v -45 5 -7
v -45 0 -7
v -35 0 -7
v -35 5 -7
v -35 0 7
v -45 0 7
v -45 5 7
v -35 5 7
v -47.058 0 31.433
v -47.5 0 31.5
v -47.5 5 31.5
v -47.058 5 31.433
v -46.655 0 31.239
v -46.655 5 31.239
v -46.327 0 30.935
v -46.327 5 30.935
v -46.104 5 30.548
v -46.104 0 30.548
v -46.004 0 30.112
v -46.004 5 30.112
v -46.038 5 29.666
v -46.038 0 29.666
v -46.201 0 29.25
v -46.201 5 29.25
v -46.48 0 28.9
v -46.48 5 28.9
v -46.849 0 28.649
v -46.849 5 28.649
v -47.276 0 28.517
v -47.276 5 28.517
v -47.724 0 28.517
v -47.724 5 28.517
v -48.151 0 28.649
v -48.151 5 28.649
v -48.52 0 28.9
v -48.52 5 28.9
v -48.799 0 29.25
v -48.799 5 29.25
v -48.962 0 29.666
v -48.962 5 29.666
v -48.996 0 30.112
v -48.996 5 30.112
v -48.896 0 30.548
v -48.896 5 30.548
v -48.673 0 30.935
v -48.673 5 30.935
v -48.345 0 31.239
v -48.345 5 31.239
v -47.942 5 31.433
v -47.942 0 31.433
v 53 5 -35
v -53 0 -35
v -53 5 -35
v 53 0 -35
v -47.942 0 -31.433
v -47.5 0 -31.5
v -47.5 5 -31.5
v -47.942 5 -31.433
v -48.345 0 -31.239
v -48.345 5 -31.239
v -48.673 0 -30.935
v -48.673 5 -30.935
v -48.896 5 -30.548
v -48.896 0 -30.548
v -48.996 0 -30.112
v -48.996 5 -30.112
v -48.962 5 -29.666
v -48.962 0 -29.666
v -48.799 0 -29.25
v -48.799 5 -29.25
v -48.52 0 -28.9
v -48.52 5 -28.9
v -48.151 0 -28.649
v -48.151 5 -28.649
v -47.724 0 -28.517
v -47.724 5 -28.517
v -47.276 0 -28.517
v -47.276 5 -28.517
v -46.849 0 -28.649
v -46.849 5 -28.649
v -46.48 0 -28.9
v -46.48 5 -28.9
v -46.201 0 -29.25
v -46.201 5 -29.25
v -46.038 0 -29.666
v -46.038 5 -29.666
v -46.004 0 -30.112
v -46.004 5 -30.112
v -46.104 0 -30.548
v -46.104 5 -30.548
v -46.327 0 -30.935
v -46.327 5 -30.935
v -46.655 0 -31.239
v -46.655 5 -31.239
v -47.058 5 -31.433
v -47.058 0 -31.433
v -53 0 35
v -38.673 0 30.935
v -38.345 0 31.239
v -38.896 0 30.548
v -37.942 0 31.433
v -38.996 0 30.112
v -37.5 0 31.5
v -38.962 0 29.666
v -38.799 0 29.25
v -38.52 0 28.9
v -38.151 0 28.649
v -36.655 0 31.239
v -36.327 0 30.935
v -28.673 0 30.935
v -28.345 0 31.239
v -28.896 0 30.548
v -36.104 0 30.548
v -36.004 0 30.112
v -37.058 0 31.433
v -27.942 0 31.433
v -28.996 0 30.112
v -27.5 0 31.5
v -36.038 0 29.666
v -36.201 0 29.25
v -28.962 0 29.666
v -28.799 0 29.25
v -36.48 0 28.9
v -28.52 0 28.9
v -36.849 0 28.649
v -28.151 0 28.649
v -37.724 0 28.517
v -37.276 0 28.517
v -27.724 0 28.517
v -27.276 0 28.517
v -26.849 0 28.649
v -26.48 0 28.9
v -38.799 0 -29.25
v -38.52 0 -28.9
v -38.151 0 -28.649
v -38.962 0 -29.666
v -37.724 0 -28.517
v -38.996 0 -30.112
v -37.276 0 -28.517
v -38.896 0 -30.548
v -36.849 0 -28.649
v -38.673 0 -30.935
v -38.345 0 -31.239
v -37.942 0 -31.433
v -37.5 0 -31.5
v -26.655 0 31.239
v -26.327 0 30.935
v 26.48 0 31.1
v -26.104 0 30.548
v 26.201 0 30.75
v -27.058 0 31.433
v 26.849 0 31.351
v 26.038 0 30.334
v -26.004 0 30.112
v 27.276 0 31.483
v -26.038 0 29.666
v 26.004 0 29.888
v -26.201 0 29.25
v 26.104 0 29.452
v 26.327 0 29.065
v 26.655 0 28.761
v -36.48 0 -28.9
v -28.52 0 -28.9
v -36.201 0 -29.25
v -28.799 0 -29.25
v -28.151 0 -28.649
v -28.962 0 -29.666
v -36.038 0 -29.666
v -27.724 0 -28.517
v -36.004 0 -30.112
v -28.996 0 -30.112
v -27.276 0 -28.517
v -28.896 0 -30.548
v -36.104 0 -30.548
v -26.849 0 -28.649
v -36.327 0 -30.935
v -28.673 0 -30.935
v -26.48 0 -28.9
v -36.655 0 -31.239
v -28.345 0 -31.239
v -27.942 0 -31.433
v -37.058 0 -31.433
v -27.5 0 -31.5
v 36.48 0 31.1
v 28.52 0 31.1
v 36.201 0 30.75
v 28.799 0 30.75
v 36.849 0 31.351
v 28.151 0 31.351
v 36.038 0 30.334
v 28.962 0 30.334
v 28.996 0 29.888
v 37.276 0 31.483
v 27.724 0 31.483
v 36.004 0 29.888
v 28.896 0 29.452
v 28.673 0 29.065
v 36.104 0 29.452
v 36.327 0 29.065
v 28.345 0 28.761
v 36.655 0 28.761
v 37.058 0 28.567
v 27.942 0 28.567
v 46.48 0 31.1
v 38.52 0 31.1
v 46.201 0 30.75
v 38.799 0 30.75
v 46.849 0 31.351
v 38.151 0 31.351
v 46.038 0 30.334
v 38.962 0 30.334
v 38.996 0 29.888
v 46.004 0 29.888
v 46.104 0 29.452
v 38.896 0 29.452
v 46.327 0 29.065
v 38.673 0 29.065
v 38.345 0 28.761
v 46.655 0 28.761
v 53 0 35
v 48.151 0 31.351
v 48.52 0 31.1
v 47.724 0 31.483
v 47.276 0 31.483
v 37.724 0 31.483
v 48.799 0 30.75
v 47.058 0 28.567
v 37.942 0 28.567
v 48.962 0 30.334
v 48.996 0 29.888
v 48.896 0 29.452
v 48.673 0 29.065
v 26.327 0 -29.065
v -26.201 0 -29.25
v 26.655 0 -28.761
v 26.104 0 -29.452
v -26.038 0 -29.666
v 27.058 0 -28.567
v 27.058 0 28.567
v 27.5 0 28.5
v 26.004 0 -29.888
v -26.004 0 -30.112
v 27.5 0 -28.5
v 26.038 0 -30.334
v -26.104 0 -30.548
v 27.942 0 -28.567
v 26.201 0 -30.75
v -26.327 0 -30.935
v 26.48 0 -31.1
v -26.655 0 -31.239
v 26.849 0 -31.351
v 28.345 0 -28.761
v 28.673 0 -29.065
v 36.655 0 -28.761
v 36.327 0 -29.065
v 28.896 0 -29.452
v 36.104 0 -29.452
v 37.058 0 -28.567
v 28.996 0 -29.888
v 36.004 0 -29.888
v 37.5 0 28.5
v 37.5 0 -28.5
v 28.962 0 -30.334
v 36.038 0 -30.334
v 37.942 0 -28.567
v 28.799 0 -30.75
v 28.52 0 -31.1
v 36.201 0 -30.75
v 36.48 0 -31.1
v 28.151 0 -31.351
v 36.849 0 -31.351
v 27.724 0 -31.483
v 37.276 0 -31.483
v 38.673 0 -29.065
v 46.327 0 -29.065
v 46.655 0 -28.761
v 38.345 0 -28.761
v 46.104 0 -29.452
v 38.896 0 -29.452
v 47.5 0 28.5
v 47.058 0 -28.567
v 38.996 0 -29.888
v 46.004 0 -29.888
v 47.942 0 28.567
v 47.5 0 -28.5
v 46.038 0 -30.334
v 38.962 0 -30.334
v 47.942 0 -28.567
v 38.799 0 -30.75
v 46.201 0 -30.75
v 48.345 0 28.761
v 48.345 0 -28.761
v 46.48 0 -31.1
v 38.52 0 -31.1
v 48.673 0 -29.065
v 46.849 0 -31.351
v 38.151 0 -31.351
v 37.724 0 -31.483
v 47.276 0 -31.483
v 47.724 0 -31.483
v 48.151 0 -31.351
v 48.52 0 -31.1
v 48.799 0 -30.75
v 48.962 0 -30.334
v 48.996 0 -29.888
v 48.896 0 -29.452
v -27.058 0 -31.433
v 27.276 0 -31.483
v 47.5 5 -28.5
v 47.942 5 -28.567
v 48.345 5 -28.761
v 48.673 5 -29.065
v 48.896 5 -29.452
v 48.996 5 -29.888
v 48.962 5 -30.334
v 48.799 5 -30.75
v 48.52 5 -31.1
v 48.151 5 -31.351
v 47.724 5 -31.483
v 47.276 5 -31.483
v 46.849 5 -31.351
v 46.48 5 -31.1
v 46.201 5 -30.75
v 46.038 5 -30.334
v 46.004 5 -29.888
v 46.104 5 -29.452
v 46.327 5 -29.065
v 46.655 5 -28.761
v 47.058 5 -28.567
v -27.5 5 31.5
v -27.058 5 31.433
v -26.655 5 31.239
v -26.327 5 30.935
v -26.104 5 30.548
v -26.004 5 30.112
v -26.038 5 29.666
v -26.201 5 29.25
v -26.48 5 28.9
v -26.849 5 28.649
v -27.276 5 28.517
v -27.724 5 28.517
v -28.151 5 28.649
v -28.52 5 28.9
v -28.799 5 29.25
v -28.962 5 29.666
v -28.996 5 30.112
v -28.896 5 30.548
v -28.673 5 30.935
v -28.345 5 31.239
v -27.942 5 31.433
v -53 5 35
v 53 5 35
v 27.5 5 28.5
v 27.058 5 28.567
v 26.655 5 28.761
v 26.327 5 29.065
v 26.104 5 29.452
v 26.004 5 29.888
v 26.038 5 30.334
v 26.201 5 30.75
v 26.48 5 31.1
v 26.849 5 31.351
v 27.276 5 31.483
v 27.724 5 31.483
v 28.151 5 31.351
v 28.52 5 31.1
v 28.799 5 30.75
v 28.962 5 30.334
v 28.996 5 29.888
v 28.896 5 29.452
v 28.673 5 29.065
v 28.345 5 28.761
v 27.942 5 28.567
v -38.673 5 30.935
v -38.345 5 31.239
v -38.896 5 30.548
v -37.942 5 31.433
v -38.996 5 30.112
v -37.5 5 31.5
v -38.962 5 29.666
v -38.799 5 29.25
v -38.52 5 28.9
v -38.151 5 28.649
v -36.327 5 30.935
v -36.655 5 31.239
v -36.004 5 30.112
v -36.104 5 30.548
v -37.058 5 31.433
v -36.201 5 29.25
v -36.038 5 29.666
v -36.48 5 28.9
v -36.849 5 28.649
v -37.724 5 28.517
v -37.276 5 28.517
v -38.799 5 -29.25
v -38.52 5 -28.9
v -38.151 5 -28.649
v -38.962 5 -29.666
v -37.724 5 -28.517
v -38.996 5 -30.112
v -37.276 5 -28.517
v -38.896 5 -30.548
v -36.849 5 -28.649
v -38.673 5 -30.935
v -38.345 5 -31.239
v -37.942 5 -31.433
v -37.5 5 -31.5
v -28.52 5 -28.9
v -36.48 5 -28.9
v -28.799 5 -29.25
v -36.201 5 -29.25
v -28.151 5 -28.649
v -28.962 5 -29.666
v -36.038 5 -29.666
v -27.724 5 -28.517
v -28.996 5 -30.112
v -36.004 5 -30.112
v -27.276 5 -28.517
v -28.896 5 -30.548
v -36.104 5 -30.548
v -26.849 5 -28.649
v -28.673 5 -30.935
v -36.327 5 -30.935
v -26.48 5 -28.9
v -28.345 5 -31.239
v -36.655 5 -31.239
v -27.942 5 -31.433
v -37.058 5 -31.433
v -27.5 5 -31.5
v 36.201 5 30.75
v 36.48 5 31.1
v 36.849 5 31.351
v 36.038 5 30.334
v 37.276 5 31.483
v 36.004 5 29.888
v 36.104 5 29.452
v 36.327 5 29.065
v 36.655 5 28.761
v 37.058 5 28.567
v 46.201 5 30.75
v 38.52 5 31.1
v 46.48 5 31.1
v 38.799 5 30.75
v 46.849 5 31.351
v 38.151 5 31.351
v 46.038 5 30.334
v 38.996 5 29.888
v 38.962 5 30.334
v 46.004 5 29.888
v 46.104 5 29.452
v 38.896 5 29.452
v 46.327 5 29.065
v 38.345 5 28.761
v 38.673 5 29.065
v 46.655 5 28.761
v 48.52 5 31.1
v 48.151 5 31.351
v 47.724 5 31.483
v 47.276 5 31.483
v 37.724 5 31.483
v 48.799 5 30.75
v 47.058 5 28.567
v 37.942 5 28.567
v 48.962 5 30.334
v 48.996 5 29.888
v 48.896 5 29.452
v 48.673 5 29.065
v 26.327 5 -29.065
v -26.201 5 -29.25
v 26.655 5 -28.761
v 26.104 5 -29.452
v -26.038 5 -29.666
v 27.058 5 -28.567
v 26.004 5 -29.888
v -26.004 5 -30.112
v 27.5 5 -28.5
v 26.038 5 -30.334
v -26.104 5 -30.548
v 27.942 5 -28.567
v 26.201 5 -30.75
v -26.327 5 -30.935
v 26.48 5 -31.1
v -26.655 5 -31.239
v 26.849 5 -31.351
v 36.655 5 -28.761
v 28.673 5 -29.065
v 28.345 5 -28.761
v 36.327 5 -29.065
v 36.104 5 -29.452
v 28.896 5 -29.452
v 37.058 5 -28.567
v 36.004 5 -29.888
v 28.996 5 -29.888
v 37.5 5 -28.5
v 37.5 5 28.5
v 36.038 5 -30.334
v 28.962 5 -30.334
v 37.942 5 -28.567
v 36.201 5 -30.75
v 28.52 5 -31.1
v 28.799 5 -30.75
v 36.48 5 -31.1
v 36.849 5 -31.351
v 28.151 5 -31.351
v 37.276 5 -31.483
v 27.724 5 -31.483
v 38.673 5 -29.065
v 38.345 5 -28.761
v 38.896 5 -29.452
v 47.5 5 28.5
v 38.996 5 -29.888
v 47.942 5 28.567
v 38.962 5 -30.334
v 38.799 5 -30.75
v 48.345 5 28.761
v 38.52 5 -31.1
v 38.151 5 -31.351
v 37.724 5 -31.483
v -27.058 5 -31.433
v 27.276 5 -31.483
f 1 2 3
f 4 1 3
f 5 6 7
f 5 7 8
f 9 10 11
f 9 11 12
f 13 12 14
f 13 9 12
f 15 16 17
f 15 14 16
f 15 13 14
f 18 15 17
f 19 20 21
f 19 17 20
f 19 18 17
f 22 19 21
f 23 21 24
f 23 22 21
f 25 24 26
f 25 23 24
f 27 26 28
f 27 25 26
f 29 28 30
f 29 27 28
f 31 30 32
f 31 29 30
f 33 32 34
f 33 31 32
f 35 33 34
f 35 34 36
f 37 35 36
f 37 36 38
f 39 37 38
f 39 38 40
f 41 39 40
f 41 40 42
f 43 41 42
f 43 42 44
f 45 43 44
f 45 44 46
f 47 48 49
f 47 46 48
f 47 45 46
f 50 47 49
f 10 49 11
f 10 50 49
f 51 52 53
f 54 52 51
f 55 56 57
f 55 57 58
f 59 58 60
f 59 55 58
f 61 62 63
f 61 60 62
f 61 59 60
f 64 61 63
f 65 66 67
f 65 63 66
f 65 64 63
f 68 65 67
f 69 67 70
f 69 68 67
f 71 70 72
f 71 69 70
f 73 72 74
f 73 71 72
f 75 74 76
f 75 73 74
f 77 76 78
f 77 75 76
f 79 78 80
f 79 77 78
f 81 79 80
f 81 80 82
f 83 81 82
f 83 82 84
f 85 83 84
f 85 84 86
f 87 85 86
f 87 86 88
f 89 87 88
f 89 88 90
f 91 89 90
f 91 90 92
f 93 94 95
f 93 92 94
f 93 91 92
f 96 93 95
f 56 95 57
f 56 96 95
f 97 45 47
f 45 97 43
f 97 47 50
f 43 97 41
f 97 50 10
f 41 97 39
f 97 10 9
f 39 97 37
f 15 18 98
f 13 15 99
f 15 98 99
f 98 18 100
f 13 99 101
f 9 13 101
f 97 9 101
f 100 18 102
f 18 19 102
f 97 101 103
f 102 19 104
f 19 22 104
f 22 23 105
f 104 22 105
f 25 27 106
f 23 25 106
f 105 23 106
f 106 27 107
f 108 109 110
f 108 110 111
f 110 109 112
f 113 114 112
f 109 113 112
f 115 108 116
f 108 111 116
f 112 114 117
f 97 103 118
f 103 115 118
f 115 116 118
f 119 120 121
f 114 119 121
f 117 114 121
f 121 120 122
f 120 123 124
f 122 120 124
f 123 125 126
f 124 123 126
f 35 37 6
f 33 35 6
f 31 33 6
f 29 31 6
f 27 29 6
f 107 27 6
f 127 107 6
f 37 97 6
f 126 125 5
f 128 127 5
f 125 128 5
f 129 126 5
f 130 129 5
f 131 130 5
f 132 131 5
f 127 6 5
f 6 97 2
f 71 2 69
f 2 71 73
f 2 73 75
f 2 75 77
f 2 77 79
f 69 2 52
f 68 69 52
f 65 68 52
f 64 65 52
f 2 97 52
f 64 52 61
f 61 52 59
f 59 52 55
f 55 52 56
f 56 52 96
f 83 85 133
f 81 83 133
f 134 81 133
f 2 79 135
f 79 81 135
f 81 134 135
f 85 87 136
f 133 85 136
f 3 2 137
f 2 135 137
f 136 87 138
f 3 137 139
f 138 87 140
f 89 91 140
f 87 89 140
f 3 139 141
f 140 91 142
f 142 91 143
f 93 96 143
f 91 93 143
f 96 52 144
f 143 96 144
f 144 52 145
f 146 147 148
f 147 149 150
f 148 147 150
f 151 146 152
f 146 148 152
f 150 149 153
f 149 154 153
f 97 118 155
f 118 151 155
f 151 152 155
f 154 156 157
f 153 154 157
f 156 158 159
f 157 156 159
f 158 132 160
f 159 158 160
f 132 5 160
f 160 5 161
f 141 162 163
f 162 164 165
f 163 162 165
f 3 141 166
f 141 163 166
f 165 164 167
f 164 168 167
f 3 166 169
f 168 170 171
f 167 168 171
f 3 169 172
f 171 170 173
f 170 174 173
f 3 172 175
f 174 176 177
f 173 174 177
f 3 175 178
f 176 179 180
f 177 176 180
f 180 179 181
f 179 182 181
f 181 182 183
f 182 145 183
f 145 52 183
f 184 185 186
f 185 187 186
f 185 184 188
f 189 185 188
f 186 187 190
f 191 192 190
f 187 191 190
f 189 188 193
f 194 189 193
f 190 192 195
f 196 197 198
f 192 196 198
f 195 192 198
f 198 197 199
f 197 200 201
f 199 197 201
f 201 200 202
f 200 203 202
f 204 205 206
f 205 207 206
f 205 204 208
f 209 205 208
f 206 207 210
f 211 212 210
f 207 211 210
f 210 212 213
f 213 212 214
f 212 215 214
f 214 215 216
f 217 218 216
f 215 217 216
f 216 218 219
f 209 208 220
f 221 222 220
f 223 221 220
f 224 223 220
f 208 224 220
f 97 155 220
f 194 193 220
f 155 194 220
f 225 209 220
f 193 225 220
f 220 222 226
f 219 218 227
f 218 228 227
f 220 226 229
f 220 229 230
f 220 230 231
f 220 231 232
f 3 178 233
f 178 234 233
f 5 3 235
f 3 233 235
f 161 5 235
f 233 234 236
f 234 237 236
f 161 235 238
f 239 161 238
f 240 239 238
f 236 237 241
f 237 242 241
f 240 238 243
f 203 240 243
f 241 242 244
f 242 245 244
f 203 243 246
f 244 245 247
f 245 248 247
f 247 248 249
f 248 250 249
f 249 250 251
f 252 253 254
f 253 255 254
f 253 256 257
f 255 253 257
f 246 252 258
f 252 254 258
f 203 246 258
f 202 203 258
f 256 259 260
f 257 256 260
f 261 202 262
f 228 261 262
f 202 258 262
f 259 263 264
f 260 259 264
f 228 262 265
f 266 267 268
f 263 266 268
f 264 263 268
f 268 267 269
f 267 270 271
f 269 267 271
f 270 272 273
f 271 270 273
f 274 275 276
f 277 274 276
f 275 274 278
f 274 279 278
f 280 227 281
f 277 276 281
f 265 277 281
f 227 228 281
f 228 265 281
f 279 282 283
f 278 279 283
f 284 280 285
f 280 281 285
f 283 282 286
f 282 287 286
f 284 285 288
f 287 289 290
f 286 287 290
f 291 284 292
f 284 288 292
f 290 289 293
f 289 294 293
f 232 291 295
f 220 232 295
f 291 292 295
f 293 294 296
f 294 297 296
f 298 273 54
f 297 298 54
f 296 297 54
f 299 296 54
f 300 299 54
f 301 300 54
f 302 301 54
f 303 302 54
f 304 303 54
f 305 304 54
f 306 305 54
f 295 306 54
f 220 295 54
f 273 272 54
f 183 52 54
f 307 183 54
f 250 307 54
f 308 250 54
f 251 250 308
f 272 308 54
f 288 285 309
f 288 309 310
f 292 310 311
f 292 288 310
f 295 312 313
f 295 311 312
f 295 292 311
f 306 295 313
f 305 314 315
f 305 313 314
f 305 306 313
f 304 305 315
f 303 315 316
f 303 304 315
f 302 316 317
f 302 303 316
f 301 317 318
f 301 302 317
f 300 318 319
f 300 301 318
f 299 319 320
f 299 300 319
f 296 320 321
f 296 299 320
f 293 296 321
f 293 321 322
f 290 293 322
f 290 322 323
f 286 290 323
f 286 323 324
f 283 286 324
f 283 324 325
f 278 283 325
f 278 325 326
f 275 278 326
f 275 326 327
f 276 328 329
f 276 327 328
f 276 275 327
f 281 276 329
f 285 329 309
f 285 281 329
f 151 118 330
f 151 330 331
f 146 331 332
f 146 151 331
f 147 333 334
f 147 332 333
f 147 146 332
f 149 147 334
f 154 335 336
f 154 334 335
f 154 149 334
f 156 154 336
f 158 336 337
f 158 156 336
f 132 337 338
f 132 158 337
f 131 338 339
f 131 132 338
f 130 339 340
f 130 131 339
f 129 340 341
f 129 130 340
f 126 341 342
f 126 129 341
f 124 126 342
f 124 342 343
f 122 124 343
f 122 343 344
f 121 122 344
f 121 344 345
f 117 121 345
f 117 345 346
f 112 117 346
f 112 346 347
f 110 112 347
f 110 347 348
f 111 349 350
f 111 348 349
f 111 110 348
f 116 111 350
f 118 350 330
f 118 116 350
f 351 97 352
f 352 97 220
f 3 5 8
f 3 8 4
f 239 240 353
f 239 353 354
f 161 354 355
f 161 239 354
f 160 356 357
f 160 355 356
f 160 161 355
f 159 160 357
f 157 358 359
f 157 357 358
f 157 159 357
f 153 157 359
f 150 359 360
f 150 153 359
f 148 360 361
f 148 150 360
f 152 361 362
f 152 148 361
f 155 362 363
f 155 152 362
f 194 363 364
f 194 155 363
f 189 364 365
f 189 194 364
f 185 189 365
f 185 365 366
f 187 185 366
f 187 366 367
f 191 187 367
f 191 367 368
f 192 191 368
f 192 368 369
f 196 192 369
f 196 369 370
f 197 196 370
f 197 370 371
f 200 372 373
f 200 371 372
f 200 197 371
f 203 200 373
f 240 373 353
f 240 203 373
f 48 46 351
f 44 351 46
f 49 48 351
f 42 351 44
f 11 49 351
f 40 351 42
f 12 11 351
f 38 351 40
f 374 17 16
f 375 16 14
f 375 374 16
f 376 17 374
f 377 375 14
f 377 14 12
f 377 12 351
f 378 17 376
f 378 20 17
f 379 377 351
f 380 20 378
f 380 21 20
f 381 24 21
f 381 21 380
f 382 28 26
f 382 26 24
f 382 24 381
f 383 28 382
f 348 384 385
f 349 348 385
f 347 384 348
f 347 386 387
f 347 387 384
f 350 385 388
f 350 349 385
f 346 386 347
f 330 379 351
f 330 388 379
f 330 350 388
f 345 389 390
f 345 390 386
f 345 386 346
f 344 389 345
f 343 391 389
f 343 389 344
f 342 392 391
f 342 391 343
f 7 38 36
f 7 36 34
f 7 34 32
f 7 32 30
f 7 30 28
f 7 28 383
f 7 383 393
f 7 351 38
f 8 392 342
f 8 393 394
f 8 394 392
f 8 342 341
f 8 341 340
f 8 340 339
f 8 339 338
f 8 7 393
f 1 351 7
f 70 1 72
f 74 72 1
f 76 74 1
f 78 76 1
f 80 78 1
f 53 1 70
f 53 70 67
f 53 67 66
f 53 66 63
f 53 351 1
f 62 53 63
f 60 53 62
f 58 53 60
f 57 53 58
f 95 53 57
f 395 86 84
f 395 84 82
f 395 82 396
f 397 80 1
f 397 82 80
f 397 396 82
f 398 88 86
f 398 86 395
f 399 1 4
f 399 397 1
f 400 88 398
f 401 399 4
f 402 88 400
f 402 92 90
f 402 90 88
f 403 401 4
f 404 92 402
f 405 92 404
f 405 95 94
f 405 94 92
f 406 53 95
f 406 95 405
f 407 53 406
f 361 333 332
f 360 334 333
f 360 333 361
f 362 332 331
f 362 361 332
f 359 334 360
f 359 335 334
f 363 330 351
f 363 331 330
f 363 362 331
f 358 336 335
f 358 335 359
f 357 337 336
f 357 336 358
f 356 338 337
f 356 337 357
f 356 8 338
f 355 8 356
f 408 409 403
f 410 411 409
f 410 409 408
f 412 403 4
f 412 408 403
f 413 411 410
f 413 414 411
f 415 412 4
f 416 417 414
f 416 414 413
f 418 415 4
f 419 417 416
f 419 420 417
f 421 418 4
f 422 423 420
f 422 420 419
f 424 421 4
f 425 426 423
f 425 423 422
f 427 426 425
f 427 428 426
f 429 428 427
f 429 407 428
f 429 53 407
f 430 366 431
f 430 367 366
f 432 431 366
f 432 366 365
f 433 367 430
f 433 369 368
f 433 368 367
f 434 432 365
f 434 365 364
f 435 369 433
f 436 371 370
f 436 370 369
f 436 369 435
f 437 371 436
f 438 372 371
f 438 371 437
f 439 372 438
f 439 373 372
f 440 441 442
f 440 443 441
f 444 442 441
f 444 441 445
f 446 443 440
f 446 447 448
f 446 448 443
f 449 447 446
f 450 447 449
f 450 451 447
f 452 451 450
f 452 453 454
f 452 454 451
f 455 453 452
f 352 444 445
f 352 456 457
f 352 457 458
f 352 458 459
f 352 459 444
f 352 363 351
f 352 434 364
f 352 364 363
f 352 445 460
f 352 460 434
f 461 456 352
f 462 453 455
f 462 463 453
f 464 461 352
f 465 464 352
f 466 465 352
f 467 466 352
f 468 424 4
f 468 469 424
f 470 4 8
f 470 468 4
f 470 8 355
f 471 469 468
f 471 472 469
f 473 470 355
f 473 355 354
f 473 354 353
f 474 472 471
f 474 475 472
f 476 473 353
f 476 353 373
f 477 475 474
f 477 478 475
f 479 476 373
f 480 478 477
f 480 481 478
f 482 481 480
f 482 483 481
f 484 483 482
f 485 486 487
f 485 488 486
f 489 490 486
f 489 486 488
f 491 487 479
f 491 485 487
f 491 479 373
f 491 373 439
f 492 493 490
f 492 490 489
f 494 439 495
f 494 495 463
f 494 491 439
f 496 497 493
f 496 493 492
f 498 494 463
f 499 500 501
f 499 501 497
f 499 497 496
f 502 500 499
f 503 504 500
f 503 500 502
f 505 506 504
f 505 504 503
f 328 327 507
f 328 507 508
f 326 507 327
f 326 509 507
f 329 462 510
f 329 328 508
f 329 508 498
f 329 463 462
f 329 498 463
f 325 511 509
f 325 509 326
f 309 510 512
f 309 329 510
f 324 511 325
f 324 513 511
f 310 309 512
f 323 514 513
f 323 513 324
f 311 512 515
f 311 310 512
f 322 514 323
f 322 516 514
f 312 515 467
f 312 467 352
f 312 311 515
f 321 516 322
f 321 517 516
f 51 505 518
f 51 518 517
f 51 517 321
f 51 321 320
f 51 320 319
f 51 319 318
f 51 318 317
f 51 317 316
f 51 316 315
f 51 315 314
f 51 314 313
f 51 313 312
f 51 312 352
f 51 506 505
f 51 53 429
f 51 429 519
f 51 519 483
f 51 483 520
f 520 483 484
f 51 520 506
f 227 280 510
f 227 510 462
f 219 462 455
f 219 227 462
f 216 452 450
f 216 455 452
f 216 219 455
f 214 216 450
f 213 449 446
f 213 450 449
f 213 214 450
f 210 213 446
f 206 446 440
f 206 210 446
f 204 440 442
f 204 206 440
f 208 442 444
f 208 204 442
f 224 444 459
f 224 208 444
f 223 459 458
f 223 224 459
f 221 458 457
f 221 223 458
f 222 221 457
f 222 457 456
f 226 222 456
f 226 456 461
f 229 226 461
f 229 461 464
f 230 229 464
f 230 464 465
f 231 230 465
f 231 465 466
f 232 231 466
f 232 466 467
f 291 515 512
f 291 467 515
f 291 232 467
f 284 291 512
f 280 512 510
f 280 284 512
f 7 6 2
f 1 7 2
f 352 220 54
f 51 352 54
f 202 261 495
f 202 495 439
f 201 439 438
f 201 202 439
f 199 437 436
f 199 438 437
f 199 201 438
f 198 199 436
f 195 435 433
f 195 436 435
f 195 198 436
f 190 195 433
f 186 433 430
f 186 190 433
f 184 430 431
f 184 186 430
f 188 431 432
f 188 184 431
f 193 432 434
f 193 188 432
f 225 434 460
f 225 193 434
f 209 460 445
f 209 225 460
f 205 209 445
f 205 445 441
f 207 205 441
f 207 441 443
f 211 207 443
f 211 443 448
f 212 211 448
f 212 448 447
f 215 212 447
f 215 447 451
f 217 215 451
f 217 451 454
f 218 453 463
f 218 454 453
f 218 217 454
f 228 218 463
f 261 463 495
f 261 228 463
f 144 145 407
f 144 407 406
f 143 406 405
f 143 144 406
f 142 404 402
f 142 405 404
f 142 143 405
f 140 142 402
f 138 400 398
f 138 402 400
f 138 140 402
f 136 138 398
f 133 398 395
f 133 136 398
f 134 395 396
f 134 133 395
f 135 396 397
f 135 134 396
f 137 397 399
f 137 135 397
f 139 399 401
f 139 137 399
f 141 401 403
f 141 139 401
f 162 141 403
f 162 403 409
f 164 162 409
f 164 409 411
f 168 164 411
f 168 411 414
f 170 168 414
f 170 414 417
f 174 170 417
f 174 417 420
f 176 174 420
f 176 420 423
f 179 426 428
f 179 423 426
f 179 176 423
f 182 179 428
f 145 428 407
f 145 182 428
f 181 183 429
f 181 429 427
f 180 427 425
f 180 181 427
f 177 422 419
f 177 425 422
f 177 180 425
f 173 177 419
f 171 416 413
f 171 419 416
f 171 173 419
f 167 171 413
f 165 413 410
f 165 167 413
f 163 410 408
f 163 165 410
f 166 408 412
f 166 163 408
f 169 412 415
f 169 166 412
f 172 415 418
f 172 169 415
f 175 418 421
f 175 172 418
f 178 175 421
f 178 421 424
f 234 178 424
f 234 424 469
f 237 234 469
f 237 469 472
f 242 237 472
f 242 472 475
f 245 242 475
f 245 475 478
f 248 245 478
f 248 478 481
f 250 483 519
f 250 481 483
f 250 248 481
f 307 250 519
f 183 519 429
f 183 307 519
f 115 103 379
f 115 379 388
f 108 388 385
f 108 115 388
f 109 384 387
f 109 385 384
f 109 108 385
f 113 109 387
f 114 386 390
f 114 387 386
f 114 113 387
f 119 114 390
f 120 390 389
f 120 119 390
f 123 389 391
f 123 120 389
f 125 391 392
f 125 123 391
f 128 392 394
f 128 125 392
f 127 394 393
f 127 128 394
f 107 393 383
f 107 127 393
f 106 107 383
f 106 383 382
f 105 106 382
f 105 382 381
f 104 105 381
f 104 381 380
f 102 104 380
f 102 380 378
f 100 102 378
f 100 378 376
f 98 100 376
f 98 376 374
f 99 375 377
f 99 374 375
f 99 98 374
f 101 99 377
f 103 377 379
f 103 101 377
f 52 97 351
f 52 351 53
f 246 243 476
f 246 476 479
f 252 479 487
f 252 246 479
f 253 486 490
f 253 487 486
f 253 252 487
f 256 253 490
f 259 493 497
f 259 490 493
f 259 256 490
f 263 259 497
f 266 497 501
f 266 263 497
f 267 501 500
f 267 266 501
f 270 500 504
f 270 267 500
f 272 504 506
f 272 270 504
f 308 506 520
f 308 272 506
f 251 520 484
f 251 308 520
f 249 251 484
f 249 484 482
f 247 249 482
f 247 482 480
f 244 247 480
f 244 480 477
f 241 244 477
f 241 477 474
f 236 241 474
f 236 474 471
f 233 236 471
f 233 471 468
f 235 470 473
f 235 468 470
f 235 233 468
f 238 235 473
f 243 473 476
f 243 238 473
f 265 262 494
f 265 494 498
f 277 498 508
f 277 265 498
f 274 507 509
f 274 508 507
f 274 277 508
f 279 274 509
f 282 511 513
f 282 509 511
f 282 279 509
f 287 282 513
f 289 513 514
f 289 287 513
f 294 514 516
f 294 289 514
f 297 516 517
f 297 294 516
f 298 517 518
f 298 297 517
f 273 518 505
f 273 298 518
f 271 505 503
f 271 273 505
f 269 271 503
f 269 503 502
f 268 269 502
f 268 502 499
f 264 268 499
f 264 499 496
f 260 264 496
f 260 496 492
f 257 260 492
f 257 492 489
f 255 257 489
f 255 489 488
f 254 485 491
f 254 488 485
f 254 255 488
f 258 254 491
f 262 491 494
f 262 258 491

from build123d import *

# Parameters (mm, degrees)
SKETCH1_W               = 120
SKETCH1_H               = 70
BOSS_EXTRUDE1_DEPTH     = 5
CUT_EXTRUDE1_DEPTH      = 70.641941386
CUT_EXTRUDE1_DEPTH_BACK = 70.641941386
SKETCH2_W               = 10
SKETCH2_H               = 14
CUT_EXTRUDE2_DEPTH      = 70.641941386
CUT_EXTRUDE2_DEPTH_BACK = 70.641941386
SKETCH3_W               = 7
SKETCH3_H               = 70
CUT_EXTRUDE3_DEPTH      = 64.710281745
CUT_EXTRUDE3_DEPTH_BACK = 64.710281745
SKETCH4_R               = 1.5


with BuildPart() as part:
    # Sketch1 → Boss-Extrude1 (new body)
    with BuildSketch(Plane(origin=(0, 0, 0), x_dir=(1, 0, 0), z_dir=(0, 1, 0))):
        Rectangle(SKETCH1_W, SKETCH1_H)
    extrude(amount=BOSS_EXTRUDE1_DEPTH)

    # Sketch2 → Cut-Extrude1 (cut, two sides: drawn at the far end of the back side and taken through both)
    with BuildSketch(Plane(origin=(0, 5, 0), x_dir=(1, 0, 0), z_dir=(0, 1, 0)).offset(-CUT_EXTRUDE1_DEPTH_BACK)):
        with Locations((-40, 0)):
            Rectangle(SKETCH2_W, SKETCH2_H)
    extrude(amount=CUT_EXTRUDE1_DEPTH + CUT_EXTRUDE1_DEPTH_BACK, mode=Mode.SUBTRACT)

    # Sketch3 → Cut-Extrude2 (cut, two sides: drawn at the far end of the back side and taken through both)
    with BuildSketch(Plane(origin=(0, 5, 0), x_dir=(1, 0, 0), z_dir=(0, 1, 0)).offset(-CUT_EXTRUDE2_DEPTH_BACK)):
        with Locations((56.5, 0)):
            Rectangle(SKETCH3_W, SKETCH3_H)
        with Locations((-56.5, 0)):
            Rectangle(SKETCH3_W, SKETCH3_H)
    extrude(amount=CUT_EXTRUDE2_DEPTH + CUT_EXTRUDE2_DEPTH_BACK, mode=Mode.SUBTRACT)

    # Sketch4 → Cut-Extrude3 (cut, two sides: drawn at the far end of the back side and taken through both)
    with BuildSketch(Plane(origin=(0, 5, 0), x_dir=(1, 0, 0), z_dir=(0, 1, 0)).offset(-CUT_EXTRUDE3_DEPTH_BACK)):
        with Locations(Location((-37.5, -30, 0), (0, 0, 270))):
            Circle(SKETCH4_R)
        with Locations(Location((-27.5, -30, 0), (0, 0, 270))):
            Circle(SKETCH4_R)
        with Locations(Location((-47.5, -30, 0), (0, 0, 270))):
            Circle(SKETCH4_R)
        with Locations(Location((27.5, -30, 0), (0, 0, 90))):
            Circle(SKETCH4_R)
        with Locations(Location((47.5, -30, 0), (0, 0, 90))):
            Circle(SKETCH4_R)
        with Locations(Location((37.5, -30, 0), (0, 0, 90))):
            Circle(SKETCH4_R)
        with Locations(Location((47.5, 30, 0), (0, 0, 270))):
            Circle(SKETCH4_R)
        with Locations(Location((37.5, 30, 0), (0, 0, 270))):
            Circle(SKETCH4_R)
        with Locations(Location((27.5, 30, 0), (0, 0, 270))):
            Circle(SKETCH4_R)
        with Locations(Location((-27.5, 30, 0), (0, 0, 90))):
            Circle(SKETCH4_R)
        with Locations(Location((-37.5, 30, 0), (0, 0, 90))):
            Circle(SKETCH4_R)
        with Locations(Location((-47.5, 30, 0), (0, 0, 90))):
            Circle(SKETCH4_R)
    extrude(amount=CUT_EXTRUDE3_DEPTH + CUT_EXTRUDE3_DEPTH_BACK, mode=Mode.SUBTRACT)


solid = part.part
